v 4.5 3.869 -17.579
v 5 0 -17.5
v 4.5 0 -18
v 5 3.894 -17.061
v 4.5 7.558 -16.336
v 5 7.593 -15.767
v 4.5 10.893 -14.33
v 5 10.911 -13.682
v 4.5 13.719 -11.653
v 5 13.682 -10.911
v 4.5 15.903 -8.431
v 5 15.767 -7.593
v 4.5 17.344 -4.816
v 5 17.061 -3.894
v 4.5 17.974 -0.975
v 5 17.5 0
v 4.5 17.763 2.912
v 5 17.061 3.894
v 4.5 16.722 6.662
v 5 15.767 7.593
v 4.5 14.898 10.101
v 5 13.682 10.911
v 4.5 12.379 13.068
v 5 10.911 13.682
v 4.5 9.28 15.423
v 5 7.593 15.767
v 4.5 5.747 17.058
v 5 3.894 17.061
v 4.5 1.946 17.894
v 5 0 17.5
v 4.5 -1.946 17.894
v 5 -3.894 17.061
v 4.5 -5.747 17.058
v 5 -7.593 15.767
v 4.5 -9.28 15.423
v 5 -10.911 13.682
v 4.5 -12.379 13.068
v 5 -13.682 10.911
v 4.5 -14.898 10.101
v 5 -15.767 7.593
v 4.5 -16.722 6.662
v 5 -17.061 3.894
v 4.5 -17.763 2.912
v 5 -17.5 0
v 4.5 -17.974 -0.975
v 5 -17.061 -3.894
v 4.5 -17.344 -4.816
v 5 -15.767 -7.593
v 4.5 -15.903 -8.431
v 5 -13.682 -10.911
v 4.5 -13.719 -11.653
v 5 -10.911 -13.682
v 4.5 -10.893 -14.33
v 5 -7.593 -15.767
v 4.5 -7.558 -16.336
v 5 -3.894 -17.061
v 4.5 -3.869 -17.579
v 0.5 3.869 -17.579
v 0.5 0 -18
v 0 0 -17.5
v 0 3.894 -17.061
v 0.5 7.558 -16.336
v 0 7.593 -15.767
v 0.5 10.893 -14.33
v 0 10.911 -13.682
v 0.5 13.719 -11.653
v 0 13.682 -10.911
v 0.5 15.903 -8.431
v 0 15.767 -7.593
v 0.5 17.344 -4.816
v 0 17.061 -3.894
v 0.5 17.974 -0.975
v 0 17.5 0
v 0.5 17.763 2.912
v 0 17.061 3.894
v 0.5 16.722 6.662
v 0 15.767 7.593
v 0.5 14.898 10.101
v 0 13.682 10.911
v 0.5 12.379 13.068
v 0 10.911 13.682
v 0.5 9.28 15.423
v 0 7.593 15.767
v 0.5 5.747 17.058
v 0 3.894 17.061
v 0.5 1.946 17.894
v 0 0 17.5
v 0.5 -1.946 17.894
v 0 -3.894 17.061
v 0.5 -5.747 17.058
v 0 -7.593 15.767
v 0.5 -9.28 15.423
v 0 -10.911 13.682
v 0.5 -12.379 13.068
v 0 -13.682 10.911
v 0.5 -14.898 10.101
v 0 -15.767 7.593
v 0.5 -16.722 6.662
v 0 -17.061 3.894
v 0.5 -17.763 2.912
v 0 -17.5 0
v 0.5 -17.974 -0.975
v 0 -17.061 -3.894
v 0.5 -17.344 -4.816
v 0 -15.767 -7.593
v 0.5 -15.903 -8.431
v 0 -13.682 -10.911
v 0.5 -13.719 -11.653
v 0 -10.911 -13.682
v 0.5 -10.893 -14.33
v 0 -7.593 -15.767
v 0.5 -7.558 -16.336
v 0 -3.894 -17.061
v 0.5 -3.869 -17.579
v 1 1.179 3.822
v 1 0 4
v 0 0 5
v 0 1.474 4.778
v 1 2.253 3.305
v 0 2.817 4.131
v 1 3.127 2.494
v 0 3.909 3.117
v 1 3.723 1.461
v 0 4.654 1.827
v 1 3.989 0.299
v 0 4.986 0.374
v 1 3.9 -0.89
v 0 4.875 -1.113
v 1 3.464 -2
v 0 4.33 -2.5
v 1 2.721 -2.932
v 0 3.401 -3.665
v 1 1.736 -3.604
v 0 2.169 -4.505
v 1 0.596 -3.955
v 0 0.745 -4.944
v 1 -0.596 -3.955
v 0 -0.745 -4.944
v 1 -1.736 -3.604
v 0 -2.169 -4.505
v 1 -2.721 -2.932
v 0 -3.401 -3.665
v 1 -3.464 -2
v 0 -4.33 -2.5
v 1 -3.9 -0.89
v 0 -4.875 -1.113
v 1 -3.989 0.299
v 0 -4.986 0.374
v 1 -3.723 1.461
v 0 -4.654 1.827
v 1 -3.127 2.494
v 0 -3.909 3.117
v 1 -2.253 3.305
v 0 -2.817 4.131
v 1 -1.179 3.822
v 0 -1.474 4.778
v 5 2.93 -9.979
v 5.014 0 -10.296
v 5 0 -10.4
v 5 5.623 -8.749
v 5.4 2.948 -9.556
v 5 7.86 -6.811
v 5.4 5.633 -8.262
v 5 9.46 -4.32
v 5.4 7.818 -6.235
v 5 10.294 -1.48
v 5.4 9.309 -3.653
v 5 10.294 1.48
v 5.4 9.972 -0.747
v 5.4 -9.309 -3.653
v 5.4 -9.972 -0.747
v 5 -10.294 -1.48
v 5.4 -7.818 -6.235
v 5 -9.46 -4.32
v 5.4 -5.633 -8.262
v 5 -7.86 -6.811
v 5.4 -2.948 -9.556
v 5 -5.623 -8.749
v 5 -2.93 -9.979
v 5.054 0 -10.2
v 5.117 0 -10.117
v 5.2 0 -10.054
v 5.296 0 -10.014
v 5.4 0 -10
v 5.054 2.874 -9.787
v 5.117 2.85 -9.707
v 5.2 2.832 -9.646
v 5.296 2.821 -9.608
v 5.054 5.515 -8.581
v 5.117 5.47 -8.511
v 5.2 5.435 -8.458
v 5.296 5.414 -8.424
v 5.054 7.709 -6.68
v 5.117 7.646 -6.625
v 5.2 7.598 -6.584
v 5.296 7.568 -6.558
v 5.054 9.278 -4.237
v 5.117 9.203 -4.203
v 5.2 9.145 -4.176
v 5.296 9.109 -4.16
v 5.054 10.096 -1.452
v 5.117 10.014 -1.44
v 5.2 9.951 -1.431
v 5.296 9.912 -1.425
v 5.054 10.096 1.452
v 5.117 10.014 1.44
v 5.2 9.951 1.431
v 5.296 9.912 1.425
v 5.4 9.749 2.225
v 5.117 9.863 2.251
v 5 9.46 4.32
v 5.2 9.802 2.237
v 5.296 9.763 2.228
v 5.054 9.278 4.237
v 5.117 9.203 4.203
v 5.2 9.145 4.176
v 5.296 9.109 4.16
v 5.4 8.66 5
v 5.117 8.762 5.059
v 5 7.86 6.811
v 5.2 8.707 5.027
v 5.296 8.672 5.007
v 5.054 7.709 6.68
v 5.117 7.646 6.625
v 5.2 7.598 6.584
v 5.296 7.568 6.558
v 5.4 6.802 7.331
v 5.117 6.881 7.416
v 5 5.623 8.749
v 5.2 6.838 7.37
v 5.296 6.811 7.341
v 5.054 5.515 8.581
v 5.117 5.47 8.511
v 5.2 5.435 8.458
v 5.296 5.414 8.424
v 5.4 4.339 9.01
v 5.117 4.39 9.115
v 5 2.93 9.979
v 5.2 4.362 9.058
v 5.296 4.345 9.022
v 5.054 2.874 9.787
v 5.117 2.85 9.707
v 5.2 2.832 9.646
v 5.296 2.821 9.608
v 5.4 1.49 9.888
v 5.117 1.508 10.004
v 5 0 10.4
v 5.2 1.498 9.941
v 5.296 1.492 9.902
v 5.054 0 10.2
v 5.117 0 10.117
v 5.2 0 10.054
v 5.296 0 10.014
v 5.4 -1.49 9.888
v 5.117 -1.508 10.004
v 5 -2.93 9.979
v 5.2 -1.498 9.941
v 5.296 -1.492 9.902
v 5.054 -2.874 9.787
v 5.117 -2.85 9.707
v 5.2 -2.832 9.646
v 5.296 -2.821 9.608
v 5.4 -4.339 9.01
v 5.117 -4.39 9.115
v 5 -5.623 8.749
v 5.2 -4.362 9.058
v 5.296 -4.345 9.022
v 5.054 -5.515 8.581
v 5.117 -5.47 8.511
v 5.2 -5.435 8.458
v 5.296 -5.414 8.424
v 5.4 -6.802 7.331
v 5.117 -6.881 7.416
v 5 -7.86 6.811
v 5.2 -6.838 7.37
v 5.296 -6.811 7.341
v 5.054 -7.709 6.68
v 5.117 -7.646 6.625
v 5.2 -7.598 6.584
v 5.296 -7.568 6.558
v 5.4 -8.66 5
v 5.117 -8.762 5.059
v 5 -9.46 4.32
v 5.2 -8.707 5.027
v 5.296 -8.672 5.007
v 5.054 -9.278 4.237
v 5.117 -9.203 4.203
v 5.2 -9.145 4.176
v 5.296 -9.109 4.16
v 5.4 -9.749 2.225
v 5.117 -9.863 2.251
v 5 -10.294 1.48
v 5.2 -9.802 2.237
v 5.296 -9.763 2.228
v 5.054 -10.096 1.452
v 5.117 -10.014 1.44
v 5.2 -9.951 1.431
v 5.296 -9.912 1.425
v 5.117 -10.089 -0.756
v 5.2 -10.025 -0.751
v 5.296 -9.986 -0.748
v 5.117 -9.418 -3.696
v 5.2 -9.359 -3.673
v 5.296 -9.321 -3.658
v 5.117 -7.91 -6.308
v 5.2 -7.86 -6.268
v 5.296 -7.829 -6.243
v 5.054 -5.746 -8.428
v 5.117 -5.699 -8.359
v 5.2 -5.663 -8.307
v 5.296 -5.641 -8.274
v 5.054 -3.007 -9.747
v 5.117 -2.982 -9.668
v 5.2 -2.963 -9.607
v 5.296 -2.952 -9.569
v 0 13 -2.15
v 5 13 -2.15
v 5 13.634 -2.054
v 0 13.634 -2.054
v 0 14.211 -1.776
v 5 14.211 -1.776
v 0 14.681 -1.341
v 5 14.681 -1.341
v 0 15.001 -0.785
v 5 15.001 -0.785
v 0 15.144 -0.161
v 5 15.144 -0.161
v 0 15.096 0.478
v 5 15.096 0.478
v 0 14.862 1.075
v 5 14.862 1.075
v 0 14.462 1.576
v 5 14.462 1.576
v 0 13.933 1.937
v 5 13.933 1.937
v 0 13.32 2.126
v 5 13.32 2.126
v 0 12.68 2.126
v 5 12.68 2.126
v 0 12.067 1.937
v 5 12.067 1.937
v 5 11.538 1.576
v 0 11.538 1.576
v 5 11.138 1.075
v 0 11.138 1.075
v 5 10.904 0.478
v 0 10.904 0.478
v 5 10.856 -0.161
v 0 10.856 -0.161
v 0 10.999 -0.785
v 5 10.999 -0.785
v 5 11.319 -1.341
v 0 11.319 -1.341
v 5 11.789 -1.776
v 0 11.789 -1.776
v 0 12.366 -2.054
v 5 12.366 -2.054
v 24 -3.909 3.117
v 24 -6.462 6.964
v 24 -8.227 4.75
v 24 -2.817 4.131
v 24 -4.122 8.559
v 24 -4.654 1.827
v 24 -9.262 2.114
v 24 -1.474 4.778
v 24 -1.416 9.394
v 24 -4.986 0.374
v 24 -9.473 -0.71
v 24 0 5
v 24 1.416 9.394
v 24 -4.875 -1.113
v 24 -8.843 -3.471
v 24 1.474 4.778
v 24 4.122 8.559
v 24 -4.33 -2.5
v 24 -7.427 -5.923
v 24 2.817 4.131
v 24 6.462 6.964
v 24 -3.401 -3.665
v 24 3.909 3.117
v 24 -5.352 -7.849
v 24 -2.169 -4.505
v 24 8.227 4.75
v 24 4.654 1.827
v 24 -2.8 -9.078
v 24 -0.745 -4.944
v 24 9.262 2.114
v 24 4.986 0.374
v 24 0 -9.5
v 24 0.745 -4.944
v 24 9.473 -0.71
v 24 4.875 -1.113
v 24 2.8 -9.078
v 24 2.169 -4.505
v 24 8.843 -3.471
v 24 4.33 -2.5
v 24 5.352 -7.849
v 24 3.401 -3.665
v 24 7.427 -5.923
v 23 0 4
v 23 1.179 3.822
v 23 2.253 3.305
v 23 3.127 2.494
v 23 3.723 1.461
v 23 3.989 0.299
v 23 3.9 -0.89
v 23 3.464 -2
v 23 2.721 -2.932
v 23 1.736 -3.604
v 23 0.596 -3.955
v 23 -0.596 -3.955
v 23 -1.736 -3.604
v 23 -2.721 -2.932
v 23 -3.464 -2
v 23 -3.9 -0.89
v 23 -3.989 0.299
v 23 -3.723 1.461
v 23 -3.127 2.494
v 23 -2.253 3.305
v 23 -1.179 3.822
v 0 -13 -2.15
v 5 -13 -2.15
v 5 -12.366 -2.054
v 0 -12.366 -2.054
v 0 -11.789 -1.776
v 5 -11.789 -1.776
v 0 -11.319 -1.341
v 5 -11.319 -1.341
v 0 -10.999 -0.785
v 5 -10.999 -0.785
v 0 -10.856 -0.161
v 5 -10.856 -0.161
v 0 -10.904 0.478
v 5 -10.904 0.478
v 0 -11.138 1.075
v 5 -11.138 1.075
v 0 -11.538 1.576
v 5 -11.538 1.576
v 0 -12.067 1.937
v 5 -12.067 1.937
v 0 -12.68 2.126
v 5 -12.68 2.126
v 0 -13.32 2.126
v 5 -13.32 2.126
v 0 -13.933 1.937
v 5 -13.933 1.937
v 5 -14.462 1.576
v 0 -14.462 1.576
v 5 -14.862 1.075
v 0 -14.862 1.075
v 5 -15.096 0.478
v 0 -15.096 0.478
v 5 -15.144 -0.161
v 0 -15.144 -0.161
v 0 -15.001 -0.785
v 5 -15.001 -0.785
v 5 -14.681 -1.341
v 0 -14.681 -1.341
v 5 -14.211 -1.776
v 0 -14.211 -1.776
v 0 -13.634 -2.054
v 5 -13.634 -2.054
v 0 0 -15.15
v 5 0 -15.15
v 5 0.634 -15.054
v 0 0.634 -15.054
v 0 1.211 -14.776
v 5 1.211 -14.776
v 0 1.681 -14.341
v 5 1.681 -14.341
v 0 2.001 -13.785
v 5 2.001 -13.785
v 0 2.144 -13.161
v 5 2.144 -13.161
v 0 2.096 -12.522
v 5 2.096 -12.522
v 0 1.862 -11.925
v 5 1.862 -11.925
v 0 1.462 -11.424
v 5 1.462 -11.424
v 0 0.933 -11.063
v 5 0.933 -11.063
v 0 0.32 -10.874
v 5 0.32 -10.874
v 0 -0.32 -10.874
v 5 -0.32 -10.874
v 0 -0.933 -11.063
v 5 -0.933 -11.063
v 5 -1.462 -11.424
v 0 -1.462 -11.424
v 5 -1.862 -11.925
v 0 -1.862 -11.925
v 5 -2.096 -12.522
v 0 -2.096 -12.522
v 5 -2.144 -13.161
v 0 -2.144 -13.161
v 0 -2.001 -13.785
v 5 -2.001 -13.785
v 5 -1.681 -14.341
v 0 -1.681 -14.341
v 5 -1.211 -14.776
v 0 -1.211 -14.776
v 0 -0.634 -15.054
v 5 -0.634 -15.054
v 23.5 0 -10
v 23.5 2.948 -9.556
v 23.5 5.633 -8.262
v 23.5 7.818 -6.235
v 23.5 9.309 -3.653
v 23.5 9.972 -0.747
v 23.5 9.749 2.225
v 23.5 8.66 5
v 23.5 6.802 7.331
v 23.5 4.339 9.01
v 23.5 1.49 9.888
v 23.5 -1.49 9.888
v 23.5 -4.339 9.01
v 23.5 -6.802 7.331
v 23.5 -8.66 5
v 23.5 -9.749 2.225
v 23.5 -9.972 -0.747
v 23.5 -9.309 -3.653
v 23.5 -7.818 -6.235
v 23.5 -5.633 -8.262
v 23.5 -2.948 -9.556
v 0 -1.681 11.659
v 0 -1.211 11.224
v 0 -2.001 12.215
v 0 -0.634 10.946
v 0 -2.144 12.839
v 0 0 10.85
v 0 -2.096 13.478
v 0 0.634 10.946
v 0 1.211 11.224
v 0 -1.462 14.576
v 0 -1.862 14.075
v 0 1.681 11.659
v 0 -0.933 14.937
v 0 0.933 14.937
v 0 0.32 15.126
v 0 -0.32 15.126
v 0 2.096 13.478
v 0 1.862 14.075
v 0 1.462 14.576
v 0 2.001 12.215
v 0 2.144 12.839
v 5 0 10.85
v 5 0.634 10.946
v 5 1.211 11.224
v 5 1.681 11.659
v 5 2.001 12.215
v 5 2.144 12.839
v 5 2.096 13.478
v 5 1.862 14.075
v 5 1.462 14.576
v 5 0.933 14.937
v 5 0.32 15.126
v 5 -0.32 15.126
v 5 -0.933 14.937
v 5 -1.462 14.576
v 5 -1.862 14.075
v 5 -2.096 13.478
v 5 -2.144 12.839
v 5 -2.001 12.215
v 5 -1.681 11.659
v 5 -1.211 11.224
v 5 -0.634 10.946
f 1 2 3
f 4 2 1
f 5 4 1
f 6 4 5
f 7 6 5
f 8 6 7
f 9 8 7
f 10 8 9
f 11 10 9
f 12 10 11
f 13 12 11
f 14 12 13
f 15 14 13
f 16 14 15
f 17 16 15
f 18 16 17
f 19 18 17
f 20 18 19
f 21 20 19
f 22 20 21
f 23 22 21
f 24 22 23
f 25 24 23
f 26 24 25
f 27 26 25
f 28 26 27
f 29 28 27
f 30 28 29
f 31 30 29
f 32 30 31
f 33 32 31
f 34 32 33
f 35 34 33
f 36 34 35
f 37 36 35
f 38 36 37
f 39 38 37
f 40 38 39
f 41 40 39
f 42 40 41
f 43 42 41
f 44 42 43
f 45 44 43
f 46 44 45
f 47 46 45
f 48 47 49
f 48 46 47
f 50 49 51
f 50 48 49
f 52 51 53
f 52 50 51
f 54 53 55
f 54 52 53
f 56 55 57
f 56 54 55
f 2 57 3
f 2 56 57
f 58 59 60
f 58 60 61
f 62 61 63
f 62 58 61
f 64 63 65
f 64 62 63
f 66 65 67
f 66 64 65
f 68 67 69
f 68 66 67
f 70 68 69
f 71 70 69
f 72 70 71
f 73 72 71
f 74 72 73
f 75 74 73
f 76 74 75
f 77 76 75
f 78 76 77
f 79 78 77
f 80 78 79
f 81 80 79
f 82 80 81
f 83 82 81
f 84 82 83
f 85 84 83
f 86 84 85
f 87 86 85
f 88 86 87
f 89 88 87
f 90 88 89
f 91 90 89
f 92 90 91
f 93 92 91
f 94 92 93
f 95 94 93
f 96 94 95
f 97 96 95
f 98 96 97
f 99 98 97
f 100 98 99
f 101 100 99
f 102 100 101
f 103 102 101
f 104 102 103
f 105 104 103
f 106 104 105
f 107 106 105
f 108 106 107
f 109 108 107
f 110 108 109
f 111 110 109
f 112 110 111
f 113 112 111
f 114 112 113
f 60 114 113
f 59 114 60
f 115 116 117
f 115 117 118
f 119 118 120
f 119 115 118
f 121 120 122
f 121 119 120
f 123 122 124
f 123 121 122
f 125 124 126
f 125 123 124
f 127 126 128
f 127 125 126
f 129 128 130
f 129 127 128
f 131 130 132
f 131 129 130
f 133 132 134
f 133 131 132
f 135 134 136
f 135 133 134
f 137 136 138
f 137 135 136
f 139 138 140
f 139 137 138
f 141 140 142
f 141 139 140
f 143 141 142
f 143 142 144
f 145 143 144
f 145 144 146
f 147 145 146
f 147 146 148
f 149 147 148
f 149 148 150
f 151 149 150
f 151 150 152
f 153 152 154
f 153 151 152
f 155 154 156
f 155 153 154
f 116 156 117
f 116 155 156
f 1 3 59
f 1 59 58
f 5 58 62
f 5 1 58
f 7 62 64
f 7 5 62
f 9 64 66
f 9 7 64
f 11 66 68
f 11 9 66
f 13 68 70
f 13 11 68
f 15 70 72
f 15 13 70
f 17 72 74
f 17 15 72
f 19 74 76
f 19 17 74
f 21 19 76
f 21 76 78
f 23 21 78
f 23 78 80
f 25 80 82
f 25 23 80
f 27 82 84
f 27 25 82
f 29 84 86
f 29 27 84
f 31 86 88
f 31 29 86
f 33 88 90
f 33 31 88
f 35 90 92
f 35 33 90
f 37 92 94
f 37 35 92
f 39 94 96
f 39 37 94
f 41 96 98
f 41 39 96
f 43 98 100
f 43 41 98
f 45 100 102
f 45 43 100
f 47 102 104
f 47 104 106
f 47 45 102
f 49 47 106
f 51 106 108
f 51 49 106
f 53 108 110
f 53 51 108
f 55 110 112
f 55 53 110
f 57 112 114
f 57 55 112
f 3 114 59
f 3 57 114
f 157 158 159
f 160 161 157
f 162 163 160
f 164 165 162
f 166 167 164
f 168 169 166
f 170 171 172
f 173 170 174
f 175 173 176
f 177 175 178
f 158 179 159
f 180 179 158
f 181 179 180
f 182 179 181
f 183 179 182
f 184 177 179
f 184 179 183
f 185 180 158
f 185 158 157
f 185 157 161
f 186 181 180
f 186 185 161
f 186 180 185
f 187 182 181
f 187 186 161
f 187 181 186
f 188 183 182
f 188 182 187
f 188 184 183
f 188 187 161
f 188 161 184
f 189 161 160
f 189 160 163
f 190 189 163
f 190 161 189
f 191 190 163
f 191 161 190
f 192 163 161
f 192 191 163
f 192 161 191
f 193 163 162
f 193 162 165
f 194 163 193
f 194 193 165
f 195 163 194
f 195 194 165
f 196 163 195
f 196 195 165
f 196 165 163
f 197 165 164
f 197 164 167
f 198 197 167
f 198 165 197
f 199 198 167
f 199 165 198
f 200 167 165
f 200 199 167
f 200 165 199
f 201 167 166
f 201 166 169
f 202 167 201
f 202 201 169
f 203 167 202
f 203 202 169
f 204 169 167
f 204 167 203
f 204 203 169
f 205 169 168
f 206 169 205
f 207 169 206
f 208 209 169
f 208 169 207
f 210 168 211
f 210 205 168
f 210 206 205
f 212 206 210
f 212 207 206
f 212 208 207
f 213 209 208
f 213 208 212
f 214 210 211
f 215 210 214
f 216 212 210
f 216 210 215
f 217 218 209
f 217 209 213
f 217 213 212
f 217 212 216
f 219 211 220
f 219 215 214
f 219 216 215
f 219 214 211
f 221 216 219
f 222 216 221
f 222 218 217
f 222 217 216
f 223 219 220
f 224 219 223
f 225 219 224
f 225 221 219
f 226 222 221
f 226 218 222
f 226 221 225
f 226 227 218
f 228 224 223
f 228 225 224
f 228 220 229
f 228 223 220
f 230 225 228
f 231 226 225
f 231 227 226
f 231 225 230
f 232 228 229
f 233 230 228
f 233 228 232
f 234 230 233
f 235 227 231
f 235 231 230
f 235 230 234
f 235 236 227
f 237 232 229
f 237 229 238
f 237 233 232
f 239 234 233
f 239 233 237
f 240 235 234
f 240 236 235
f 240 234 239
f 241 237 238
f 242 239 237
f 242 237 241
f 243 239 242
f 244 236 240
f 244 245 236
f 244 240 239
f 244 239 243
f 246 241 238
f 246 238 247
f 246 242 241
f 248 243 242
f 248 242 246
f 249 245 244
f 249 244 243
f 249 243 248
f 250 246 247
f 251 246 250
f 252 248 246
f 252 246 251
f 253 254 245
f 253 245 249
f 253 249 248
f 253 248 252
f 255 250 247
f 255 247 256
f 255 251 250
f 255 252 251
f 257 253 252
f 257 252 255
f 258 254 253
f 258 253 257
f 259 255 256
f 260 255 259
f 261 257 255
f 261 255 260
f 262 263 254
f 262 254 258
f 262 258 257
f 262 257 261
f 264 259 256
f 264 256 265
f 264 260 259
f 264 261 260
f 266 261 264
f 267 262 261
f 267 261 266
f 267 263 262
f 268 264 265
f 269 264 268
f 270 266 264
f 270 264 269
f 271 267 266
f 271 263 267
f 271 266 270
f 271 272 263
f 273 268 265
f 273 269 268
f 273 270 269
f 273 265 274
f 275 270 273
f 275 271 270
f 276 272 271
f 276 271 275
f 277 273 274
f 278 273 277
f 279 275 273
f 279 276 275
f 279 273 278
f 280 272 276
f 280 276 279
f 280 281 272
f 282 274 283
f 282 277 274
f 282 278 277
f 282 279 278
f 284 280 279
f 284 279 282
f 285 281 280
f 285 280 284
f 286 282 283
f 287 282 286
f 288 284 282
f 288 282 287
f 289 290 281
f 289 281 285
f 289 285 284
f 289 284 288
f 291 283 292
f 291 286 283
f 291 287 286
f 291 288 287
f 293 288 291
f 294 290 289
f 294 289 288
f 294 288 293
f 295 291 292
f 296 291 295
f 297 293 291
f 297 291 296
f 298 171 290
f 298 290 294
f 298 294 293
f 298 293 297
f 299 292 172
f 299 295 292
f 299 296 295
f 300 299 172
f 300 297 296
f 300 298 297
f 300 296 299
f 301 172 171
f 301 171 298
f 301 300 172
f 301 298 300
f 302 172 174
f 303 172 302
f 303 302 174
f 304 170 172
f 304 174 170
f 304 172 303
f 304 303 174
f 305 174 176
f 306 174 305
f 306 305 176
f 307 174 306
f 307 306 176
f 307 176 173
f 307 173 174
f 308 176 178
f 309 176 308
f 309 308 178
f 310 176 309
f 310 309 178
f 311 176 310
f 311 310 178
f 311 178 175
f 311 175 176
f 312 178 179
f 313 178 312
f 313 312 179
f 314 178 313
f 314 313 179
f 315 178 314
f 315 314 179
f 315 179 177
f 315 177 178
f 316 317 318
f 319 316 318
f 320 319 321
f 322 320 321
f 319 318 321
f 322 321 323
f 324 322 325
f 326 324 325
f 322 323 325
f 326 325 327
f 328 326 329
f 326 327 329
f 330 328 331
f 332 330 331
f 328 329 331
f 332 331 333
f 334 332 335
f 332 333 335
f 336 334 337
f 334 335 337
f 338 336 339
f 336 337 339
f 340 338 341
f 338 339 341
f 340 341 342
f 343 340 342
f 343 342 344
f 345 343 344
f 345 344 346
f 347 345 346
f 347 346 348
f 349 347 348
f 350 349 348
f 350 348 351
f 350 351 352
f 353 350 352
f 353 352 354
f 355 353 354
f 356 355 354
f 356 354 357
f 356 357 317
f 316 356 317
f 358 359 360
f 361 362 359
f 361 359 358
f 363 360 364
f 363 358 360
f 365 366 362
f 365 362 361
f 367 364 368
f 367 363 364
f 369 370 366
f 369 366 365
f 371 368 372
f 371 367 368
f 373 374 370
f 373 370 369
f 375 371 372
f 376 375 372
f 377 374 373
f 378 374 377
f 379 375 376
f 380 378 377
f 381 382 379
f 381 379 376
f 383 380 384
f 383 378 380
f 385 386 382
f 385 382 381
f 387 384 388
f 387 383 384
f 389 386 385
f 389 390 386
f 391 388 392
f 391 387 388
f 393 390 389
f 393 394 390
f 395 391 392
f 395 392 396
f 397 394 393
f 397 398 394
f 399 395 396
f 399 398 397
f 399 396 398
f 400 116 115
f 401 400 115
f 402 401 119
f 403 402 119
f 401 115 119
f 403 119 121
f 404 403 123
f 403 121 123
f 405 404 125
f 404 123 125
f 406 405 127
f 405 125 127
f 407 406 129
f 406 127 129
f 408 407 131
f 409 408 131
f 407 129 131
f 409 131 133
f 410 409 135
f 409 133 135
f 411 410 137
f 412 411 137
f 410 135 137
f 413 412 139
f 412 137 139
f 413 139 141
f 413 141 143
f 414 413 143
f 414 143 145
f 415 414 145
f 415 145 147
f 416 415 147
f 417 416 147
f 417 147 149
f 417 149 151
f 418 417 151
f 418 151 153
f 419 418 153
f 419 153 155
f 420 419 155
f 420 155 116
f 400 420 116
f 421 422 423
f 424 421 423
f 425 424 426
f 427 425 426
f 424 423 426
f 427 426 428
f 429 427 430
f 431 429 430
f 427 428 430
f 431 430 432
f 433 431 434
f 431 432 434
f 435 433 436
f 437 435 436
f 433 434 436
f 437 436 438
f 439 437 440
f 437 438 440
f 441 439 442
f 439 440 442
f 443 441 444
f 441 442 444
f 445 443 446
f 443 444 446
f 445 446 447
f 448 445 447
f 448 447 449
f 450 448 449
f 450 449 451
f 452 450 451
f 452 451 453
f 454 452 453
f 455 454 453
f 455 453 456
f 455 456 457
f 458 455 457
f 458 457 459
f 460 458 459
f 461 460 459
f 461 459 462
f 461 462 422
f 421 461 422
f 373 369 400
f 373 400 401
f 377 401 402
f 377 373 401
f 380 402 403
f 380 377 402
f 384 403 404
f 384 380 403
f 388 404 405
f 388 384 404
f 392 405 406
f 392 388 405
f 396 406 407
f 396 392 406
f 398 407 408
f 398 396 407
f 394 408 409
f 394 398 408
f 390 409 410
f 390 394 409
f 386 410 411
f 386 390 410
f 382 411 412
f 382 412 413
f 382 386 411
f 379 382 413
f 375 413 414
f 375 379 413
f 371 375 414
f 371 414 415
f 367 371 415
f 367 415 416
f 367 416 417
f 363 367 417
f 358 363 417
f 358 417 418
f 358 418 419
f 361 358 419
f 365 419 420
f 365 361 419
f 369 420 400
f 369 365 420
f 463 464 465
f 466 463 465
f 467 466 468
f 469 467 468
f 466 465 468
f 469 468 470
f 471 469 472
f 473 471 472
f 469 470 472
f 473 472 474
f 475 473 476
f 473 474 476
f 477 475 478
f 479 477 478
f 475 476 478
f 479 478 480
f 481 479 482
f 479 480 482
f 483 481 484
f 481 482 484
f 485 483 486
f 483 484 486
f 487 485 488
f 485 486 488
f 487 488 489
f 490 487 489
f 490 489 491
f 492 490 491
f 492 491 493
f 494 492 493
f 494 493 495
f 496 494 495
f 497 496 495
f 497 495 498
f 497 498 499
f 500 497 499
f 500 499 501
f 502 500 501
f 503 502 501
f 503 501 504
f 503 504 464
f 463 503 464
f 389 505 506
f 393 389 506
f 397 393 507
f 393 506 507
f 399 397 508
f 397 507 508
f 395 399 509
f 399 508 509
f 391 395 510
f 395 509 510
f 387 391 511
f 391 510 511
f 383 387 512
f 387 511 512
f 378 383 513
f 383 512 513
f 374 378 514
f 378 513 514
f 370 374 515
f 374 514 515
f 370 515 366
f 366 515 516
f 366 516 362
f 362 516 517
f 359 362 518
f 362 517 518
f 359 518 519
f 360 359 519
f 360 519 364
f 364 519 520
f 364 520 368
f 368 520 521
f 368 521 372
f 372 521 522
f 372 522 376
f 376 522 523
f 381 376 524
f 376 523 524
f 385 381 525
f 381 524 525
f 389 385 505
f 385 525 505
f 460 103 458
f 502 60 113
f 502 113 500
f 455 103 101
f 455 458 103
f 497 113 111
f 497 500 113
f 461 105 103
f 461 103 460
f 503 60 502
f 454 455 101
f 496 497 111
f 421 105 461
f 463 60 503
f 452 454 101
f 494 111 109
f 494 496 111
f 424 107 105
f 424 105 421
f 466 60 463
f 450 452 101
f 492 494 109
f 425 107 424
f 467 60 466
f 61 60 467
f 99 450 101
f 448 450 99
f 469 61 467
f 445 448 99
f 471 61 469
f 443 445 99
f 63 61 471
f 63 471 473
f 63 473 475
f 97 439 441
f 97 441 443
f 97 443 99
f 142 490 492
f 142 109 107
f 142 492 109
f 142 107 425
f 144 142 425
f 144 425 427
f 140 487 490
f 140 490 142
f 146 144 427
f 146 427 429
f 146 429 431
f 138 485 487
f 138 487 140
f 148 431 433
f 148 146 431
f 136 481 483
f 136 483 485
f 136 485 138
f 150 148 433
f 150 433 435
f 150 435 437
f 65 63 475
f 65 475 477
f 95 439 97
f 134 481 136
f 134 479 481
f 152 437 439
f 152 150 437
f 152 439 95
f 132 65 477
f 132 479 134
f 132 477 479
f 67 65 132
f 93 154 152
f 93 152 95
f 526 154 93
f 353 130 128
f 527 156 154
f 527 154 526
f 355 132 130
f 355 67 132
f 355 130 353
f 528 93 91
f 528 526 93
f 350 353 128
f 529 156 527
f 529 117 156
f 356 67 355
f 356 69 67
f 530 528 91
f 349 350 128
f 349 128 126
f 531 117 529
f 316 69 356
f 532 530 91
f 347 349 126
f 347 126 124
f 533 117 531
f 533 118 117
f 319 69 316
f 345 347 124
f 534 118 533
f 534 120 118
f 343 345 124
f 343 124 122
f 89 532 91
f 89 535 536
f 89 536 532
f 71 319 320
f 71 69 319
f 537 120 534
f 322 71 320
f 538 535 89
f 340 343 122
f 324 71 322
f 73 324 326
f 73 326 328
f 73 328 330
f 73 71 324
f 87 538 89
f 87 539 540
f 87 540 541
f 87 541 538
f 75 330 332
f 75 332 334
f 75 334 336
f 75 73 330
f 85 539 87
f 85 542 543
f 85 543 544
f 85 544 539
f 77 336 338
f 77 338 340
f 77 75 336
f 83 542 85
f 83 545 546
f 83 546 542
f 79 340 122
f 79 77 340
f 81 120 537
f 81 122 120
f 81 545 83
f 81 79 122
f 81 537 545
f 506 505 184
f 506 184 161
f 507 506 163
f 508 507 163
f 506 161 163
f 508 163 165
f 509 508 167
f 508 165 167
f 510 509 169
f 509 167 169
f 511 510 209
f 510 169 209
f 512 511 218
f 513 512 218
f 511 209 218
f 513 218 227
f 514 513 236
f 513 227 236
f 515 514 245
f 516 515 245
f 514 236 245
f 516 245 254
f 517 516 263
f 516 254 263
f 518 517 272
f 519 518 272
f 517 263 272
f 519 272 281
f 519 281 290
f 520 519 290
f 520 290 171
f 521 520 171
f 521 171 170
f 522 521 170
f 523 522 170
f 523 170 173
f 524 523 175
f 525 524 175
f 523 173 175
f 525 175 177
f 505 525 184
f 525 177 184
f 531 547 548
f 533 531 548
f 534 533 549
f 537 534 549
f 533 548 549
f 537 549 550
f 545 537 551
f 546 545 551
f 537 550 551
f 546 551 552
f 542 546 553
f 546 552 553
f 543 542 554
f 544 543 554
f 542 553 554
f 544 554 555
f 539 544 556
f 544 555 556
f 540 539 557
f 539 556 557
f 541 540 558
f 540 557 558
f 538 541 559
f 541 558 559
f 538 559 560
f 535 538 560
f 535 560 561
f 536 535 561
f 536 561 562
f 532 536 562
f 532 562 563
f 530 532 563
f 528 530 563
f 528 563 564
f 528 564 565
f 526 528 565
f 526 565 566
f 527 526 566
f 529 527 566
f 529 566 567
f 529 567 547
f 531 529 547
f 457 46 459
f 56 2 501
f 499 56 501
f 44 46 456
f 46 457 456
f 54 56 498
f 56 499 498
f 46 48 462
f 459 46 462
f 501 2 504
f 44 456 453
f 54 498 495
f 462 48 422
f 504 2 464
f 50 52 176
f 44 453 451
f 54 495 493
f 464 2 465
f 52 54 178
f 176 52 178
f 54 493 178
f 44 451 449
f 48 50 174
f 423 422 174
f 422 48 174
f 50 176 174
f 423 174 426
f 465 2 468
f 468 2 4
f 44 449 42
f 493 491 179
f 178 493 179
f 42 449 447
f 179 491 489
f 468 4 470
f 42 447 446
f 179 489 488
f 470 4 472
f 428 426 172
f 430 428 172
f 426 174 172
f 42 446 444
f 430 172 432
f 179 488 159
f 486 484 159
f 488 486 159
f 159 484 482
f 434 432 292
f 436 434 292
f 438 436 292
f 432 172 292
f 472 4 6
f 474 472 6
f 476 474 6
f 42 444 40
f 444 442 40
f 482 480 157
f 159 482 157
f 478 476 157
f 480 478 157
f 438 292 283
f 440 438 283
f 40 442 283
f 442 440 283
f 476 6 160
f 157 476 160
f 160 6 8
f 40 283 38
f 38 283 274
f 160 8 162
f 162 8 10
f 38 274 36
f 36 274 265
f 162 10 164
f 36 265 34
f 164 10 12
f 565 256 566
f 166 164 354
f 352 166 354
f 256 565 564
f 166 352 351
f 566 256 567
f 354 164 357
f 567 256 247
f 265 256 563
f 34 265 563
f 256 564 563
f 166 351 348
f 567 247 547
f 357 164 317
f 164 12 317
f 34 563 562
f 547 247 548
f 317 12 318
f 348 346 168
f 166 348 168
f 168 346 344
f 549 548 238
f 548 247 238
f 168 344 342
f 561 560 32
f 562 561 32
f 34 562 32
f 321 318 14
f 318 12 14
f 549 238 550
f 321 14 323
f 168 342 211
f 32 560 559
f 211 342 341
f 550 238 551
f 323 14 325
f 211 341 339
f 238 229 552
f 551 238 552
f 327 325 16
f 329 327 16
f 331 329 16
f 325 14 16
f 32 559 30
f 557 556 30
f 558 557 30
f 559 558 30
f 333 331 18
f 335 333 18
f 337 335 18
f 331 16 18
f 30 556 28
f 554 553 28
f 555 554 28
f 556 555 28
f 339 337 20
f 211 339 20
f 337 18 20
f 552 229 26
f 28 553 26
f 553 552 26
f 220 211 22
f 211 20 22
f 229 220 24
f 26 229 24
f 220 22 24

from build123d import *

# Parameters (mm, degrees)
SKETCH1_W                      = 5
SKETCH1_H                      = 18
SKETCH2_R                      = 10
BOSS_EXTRUDE1_DEPTH            = 19
F_4_3_4_3_DIAMETER_HOLE1_D     = 4.3
F_4_3_4_3_DIAMETER_HOLE1_DEPTH = 24
F_8_0_8_DIAMETER_HOLE1_D       = 8
CHAMFER1_SIZE                  = 0.5
CHAMFER2_SIZE                  = 1
FILLET1_R                      = 0.4


with BuildPart() as part:
    # Sketch1 → Revolve1 (revolve)
    with BuildSketch(Plane.XY, mode=Mode.PRIVATE) as revolve1_sk:
        with Locations((2.5, 9)):
            Rectangle(SKETCH1_W, SKETCH1_H)
    revolve(revolve1_sk.sketch.rotate(Axis((0, 0, 0), (1, 0, 0)), 270), axis=Axis((0, 0, 0), (1, 0, 0)))

    # Sketch2 → Boss-Extrude1 (add)
    with BuildSketch(Plane(origin=(5, 0, 0), x_dir=(0, 0, -1), z_dir=(1, 0, 0))):
        Circle(SKETCH2_R)
    extrude(amount=BOSS_EXTRUDE1_DEPTH)

    # Ø4.3 (4.3) Diameter Hole1
    with Locations(Plane.ZY):
        with Locations((0, 13), (0, -13), (-13, 0), (13, 0)):
            Hole(F_4_3_4_3_DIAMETER_HOLE1_D / 2, depth=F_4_3_4_3_DIAMETER_HOLE1_DEPTH)

    # Ø8.0 (8) Diameter Hole1 (through all)
    with Locations(Plane(origin=(24, 0, 0), x_dir=(0, 0, -1), z_dir=(1, 0, 0))):
        with Locations((0, 0)):
            Hole(F_8_0_8_DIAMETER_HOLE1_D / 2)

    # Chamfer1
    chamfer1_edges = [part.edges().sort_by_distance(p)[0] for p in [
        (5, 0, 18),
        (0, 0, 18),
        (24, 0, 10),
    ]]
    chamfer(chamfer1_edges, length=CHAMFER1_SIZE)

    # Chamfer2
    chamfer2_edges = [part.edges().sort_by_distance(p)[0] for p in [
        (24, 0, -4),
        (0, 0, -4),
    ]]
    chamfer(chamfer2_edges, length=CHAMFER2_SIZE)

    # Fillet1
    fillet1_edges = [part.edges().sort_by_distance(p)[0] for p in [
        (5, 0, 10),
    ]]
    fillet(fillet1_edges, radius=FILLET1_R)


solid = part.part
